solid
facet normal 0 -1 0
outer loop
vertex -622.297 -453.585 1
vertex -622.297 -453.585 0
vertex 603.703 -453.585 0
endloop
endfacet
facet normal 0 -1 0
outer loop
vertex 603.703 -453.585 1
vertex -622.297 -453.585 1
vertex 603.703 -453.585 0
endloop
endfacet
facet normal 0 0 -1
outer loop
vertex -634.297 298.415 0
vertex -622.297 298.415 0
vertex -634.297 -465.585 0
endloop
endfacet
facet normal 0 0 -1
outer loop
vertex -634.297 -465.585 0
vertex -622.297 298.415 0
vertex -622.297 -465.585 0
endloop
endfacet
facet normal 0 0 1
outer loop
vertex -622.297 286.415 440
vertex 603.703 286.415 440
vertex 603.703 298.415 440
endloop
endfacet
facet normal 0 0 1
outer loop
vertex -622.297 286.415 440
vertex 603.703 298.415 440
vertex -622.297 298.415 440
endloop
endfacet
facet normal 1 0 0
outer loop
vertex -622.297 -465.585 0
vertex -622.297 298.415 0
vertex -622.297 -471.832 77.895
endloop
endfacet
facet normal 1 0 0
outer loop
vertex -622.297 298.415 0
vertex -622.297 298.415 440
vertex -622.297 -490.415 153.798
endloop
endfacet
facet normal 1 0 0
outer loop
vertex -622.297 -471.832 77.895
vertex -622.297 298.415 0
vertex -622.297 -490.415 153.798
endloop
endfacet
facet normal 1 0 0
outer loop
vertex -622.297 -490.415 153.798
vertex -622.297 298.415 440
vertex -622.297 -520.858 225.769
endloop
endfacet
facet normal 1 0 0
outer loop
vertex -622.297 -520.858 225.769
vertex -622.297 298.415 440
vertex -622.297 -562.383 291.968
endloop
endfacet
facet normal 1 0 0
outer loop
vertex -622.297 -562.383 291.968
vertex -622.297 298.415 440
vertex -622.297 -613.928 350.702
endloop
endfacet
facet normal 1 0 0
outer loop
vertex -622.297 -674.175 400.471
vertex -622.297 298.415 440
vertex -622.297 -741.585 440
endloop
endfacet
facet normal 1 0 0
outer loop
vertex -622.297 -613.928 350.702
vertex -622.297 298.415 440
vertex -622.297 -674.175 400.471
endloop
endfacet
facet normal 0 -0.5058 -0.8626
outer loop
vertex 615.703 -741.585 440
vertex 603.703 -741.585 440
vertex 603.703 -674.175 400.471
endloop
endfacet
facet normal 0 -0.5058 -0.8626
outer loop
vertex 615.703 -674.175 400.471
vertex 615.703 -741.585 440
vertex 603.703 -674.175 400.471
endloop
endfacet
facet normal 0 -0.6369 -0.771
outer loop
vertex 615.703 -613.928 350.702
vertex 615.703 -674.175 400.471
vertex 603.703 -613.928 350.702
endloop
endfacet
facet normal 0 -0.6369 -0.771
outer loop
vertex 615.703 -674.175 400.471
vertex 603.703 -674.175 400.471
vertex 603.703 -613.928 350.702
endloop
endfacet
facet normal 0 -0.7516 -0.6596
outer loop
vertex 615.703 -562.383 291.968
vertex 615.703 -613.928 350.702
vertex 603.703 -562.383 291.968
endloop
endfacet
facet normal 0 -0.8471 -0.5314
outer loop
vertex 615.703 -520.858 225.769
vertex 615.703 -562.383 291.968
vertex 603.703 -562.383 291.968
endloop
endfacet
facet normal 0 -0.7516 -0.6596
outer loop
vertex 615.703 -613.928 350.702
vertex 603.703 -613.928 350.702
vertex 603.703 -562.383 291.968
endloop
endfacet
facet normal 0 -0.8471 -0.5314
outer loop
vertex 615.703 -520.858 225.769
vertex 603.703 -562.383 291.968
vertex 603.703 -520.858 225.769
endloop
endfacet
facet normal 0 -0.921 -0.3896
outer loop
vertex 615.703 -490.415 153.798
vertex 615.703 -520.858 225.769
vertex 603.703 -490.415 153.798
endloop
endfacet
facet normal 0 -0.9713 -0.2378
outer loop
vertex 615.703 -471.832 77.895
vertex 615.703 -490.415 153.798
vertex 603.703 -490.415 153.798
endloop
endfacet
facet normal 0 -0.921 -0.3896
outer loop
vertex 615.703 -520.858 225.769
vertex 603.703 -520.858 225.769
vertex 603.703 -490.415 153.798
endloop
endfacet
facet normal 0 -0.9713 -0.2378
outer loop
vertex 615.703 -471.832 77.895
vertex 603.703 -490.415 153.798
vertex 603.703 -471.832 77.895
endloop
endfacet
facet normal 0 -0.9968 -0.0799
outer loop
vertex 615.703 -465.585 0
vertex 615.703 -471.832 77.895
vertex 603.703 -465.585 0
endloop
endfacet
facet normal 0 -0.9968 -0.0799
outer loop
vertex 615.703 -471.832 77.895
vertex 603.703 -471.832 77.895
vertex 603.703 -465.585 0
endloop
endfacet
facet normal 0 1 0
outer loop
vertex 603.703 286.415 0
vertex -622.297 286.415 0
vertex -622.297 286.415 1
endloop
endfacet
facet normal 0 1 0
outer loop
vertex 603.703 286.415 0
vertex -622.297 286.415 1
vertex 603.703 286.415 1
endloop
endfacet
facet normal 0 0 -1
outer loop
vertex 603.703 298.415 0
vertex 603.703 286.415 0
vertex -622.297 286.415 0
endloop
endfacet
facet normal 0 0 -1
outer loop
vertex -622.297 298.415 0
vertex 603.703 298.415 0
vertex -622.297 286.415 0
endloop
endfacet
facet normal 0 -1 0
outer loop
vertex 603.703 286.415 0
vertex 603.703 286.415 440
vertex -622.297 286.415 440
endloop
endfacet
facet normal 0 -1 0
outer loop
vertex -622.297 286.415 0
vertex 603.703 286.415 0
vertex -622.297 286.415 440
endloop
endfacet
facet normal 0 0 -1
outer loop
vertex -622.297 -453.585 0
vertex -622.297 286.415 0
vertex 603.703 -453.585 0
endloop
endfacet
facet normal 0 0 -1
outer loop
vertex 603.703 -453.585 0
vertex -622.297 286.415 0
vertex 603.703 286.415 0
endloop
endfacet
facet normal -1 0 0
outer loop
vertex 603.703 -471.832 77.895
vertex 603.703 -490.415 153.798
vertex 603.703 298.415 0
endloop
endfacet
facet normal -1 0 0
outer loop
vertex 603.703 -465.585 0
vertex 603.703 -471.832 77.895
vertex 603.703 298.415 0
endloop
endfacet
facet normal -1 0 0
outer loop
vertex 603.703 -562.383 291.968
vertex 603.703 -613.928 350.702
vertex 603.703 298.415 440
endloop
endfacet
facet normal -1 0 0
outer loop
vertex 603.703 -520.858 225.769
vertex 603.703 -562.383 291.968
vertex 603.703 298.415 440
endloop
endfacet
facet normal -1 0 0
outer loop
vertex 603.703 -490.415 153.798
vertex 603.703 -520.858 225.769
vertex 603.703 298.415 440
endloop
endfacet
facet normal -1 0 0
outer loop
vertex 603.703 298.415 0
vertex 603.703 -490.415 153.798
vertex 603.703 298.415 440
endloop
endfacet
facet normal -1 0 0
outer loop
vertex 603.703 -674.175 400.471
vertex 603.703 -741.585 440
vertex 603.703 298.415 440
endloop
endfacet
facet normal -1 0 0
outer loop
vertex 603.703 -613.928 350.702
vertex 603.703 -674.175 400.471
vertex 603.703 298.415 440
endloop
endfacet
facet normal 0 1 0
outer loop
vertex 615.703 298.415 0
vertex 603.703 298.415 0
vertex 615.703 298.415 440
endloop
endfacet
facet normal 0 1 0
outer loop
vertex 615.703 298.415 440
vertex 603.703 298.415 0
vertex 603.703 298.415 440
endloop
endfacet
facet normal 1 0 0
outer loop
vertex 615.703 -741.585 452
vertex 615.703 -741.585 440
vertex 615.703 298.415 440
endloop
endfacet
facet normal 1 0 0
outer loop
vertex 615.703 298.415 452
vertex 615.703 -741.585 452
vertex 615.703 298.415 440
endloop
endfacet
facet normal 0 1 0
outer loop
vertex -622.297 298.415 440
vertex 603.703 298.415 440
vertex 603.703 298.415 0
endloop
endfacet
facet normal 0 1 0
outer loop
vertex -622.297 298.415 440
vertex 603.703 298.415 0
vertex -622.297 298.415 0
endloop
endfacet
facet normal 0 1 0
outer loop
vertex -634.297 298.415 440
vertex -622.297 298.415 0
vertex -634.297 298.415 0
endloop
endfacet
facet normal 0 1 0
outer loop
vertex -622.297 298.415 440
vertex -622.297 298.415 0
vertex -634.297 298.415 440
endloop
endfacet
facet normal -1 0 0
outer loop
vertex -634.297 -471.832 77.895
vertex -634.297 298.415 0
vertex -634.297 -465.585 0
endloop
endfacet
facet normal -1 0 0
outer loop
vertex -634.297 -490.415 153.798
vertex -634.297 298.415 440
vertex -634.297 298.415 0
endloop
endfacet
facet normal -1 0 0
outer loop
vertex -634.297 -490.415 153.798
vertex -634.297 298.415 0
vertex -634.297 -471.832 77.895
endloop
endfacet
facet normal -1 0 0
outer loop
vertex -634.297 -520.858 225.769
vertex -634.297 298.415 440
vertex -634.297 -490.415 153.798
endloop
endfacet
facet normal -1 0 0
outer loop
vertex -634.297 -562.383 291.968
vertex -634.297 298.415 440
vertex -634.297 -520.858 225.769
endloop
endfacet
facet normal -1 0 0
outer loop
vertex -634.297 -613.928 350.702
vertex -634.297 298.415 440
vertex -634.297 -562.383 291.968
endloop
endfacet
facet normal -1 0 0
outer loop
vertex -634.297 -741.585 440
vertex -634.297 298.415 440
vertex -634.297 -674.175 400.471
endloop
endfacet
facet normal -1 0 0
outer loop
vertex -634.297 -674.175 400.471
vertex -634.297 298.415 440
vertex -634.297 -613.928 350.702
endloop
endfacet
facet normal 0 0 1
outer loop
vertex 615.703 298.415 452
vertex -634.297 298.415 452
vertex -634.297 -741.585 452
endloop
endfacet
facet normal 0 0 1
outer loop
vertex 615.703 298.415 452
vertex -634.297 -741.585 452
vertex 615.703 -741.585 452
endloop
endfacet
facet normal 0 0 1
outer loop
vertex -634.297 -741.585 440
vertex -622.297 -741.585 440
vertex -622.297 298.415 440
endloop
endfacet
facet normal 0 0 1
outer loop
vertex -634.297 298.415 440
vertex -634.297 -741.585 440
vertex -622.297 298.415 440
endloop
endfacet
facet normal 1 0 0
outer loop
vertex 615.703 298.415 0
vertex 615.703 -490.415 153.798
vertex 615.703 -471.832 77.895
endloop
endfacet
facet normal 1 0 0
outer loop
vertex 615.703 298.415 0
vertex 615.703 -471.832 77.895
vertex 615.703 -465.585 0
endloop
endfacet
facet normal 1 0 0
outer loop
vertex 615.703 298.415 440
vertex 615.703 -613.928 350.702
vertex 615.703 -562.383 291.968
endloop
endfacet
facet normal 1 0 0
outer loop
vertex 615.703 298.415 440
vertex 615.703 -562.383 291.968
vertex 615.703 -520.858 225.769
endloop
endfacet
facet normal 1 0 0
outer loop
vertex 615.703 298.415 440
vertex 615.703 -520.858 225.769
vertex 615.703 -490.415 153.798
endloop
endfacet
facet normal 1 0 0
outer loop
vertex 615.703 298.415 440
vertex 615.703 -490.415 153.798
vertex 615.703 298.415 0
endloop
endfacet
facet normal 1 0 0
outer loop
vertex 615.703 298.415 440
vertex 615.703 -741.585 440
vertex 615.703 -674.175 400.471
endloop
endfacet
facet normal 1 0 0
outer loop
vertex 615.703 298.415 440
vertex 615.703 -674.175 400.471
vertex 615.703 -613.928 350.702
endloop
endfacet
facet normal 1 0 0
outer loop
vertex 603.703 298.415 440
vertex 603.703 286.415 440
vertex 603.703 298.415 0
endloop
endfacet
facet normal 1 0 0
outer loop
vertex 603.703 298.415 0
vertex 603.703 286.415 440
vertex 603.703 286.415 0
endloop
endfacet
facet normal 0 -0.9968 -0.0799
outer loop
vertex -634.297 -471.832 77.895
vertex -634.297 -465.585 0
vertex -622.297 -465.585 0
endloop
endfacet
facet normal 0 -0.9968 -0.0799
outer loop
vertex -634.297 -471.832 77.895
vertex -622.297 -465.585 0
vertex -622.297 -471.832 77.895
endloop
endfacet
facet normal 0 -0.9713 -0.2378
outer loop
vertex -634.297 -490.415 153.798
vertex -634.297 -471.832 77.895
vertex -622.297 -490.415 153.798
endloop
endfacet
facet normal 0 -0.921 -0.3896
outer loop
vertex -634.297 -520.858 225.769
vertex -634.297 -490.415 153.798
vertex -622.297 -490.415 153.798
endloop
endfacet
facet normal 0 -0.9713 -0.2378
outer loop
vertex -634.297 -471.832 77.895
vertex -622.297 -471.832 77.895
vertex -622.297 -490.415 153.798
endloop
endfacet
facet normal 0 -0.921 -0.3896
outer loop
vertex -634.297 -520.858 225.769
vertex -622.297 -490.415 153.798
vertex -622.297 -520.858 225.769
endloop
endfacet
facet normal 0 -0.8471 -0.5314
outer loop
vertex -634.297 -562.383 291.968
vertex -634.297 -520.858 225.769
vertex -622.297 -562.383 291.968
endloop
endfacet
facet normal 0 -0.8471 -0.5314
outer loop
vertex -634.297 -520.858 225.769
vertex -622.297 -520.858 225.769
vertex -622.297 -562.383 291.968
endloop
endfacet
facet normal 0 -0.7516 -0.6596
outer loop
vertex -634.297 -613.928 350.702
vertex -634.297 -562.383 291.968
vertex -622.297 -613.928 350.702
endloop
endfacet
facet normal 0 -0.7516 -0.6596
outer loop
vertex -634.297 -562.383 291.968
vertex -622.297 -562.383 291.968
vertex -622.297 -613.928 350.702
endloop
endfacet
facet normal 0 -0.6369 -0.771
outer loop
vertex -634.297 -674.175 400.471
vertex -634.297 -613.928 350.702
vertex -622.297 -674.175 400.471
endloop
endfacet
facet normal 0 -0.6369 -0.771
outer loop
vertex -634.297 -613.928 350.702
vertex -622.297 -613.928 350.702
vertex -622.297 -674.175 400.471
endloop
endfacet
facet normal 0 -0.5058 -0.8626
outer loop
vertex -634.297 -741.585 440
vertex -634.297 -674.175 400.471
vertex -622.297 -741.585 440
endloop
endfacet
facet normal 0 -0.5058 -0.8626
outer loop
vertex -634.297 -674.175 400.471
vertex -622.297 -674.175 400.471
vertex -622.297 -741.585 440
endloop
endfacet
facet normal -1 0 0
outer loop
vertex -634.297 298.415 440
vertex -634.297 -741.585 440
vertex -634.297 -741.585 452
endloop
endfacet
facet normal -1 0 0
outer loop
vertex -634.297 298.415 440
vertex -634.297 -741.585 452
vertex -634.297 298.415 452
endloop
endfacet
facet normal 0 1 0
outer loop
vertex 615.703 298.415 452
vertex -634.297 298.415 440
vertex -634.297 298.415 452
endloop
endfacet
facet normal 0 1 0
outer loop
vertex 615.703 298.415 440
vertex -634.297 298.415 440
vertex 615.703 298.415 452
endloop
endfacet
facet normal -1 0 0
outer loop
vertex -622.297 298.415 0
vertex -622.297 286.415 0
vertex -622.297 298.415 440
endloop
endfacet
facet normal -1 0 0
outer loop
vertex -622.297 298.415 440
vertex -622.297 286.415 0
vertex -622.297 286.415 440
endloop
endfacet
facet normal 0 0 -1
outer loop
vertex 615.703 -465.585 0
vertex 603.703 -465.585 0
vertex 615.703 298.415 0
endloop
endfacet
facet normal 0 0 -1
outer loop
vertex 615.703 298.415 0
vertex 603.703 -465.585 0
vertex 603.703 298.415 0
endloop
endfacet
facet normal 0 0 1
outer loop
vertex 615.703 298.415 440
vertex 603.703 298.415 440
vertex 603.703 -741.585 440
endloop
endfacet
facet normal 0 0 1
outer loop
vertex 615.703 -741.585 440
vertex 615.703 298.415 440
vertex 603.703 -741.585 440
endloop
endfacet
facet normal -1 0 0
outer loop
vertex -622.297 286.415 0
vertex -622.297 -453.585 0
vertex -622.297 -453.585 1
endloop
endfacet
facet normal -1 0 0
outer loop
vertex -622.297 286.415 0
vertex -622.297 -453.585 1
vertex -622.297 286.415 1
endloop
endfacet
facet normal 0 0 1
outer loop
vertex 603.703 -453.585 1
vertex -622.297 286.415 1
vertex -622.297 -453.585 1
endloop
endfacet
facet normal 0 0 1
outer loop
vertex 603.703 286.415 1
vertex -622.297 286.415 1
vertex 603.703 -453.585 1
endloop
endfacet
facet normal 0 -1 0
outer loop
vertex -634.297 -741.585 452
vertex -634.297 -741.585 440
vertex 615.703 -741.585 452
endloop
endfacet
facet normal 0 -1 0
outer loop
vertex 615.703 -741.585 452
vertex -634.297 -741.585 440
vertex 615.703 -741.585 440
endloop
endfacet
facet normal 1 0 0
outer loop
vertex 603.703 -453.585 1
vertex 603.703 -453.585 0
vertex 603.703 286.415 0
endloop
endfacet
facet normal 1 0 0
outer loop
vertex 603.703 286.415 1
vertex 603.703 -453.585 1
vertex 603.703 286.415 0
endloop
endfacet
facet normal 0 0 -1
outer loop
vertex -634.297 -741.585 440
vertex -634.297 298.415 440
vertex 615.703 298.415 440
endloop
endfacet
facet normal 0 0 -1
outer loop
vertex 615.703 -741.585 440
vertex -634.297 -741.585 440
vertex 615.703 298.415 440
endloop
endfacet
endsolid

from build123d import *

# Parameters (mm, degrees)
F0_W      = 1226
F0_H      = 740
F1_DEPTH  = 1
F2_W      = 1226
F2_H      = 439
F2_H_2    = 1
F3_DEPTH  = 12
F5_W      = 12
F5_H      = 440
F6_DEPTH  = 12
F8_DEPTH  = 12
F9_W      = 1250
F9_H      = 1040
F10_DEPTH = 12


with BuildPart() as f1:
    # F0 (on Top) → F1 (new body)
    with BuildSketch(Plane.XY):
        with Locations((-9.297022, -83.584812)):
            Rectangle(F0_W, F0_H)
    extrude(amount=F1_DEPTH)


with BuildPart() as f3:
    # F2 (on face) → F3 (new body)
    with BuildSketch(Plane(origin=(0, 286.415188, 0), x_dir=(-1, 0, 0), z_dir=(0, 1, 0))):
        with Locations((9.297022, 220.5)):
            Rectangle(F2_W, F2_H)
        with Locations((9.297022, 0.5)):
            Rectangle(F2_W, F2_H_2)
    extrude(amount=F3_DEPTH)


with BuildPart() as f6:
    # F5 (on face) → F6 (new body)
    with BuildSketch(Plane(origin=(-622.297022, 0, 0), x_dir=(0, -1, 0), z_dir=(-1, 0, 0))):
        with BuildLine():
            Line((741.584812, 440), (-286.415188, 440))
            Line((-286.415188, 440), (-286.415188, 0))
            Line((-286.415188, 0), (465.584812, 0))
            ThreePointArc((465.584812, 0), (540.295233, 259.699827), (741.584812, 440))
        make_face()
        with Locations((-292.415188, 220)):
            Rectangle(F5_W, F5_H)
    extrude(amount=F6_DEPTH)


with BuildPart() as f8:
    # F7 (on face) → F8 (new body)
    with BuildSketch(Plane.YZ.offset(603.702978)):
        with BuildLine():
            ThreePointArc((-741.584812, 440), (-540.295233, 259.699827), (-465.584812, 0))
            Line((-465.584812, 0), (298.415188, 0))
            Line((298.415188, 0), (298.415188, 440))
            Line((298.415188, 440), (-741.584812, 440))
        make_face()
    extrude(amount=F8_DEPTH)


with BuildPart() as f10:
    # F9 (on face) → F10 (new body)
    with BuildSketch(Plane.XY.offset(440)):
        with Locations((-9.297022, -221.584812)):
            Rectangle(F9_W, F9_H)
    extrude(amount=F10_DEPTH)


solid = Compound([f1.part, f3.part, f6.part, f8.part, f10.part])
